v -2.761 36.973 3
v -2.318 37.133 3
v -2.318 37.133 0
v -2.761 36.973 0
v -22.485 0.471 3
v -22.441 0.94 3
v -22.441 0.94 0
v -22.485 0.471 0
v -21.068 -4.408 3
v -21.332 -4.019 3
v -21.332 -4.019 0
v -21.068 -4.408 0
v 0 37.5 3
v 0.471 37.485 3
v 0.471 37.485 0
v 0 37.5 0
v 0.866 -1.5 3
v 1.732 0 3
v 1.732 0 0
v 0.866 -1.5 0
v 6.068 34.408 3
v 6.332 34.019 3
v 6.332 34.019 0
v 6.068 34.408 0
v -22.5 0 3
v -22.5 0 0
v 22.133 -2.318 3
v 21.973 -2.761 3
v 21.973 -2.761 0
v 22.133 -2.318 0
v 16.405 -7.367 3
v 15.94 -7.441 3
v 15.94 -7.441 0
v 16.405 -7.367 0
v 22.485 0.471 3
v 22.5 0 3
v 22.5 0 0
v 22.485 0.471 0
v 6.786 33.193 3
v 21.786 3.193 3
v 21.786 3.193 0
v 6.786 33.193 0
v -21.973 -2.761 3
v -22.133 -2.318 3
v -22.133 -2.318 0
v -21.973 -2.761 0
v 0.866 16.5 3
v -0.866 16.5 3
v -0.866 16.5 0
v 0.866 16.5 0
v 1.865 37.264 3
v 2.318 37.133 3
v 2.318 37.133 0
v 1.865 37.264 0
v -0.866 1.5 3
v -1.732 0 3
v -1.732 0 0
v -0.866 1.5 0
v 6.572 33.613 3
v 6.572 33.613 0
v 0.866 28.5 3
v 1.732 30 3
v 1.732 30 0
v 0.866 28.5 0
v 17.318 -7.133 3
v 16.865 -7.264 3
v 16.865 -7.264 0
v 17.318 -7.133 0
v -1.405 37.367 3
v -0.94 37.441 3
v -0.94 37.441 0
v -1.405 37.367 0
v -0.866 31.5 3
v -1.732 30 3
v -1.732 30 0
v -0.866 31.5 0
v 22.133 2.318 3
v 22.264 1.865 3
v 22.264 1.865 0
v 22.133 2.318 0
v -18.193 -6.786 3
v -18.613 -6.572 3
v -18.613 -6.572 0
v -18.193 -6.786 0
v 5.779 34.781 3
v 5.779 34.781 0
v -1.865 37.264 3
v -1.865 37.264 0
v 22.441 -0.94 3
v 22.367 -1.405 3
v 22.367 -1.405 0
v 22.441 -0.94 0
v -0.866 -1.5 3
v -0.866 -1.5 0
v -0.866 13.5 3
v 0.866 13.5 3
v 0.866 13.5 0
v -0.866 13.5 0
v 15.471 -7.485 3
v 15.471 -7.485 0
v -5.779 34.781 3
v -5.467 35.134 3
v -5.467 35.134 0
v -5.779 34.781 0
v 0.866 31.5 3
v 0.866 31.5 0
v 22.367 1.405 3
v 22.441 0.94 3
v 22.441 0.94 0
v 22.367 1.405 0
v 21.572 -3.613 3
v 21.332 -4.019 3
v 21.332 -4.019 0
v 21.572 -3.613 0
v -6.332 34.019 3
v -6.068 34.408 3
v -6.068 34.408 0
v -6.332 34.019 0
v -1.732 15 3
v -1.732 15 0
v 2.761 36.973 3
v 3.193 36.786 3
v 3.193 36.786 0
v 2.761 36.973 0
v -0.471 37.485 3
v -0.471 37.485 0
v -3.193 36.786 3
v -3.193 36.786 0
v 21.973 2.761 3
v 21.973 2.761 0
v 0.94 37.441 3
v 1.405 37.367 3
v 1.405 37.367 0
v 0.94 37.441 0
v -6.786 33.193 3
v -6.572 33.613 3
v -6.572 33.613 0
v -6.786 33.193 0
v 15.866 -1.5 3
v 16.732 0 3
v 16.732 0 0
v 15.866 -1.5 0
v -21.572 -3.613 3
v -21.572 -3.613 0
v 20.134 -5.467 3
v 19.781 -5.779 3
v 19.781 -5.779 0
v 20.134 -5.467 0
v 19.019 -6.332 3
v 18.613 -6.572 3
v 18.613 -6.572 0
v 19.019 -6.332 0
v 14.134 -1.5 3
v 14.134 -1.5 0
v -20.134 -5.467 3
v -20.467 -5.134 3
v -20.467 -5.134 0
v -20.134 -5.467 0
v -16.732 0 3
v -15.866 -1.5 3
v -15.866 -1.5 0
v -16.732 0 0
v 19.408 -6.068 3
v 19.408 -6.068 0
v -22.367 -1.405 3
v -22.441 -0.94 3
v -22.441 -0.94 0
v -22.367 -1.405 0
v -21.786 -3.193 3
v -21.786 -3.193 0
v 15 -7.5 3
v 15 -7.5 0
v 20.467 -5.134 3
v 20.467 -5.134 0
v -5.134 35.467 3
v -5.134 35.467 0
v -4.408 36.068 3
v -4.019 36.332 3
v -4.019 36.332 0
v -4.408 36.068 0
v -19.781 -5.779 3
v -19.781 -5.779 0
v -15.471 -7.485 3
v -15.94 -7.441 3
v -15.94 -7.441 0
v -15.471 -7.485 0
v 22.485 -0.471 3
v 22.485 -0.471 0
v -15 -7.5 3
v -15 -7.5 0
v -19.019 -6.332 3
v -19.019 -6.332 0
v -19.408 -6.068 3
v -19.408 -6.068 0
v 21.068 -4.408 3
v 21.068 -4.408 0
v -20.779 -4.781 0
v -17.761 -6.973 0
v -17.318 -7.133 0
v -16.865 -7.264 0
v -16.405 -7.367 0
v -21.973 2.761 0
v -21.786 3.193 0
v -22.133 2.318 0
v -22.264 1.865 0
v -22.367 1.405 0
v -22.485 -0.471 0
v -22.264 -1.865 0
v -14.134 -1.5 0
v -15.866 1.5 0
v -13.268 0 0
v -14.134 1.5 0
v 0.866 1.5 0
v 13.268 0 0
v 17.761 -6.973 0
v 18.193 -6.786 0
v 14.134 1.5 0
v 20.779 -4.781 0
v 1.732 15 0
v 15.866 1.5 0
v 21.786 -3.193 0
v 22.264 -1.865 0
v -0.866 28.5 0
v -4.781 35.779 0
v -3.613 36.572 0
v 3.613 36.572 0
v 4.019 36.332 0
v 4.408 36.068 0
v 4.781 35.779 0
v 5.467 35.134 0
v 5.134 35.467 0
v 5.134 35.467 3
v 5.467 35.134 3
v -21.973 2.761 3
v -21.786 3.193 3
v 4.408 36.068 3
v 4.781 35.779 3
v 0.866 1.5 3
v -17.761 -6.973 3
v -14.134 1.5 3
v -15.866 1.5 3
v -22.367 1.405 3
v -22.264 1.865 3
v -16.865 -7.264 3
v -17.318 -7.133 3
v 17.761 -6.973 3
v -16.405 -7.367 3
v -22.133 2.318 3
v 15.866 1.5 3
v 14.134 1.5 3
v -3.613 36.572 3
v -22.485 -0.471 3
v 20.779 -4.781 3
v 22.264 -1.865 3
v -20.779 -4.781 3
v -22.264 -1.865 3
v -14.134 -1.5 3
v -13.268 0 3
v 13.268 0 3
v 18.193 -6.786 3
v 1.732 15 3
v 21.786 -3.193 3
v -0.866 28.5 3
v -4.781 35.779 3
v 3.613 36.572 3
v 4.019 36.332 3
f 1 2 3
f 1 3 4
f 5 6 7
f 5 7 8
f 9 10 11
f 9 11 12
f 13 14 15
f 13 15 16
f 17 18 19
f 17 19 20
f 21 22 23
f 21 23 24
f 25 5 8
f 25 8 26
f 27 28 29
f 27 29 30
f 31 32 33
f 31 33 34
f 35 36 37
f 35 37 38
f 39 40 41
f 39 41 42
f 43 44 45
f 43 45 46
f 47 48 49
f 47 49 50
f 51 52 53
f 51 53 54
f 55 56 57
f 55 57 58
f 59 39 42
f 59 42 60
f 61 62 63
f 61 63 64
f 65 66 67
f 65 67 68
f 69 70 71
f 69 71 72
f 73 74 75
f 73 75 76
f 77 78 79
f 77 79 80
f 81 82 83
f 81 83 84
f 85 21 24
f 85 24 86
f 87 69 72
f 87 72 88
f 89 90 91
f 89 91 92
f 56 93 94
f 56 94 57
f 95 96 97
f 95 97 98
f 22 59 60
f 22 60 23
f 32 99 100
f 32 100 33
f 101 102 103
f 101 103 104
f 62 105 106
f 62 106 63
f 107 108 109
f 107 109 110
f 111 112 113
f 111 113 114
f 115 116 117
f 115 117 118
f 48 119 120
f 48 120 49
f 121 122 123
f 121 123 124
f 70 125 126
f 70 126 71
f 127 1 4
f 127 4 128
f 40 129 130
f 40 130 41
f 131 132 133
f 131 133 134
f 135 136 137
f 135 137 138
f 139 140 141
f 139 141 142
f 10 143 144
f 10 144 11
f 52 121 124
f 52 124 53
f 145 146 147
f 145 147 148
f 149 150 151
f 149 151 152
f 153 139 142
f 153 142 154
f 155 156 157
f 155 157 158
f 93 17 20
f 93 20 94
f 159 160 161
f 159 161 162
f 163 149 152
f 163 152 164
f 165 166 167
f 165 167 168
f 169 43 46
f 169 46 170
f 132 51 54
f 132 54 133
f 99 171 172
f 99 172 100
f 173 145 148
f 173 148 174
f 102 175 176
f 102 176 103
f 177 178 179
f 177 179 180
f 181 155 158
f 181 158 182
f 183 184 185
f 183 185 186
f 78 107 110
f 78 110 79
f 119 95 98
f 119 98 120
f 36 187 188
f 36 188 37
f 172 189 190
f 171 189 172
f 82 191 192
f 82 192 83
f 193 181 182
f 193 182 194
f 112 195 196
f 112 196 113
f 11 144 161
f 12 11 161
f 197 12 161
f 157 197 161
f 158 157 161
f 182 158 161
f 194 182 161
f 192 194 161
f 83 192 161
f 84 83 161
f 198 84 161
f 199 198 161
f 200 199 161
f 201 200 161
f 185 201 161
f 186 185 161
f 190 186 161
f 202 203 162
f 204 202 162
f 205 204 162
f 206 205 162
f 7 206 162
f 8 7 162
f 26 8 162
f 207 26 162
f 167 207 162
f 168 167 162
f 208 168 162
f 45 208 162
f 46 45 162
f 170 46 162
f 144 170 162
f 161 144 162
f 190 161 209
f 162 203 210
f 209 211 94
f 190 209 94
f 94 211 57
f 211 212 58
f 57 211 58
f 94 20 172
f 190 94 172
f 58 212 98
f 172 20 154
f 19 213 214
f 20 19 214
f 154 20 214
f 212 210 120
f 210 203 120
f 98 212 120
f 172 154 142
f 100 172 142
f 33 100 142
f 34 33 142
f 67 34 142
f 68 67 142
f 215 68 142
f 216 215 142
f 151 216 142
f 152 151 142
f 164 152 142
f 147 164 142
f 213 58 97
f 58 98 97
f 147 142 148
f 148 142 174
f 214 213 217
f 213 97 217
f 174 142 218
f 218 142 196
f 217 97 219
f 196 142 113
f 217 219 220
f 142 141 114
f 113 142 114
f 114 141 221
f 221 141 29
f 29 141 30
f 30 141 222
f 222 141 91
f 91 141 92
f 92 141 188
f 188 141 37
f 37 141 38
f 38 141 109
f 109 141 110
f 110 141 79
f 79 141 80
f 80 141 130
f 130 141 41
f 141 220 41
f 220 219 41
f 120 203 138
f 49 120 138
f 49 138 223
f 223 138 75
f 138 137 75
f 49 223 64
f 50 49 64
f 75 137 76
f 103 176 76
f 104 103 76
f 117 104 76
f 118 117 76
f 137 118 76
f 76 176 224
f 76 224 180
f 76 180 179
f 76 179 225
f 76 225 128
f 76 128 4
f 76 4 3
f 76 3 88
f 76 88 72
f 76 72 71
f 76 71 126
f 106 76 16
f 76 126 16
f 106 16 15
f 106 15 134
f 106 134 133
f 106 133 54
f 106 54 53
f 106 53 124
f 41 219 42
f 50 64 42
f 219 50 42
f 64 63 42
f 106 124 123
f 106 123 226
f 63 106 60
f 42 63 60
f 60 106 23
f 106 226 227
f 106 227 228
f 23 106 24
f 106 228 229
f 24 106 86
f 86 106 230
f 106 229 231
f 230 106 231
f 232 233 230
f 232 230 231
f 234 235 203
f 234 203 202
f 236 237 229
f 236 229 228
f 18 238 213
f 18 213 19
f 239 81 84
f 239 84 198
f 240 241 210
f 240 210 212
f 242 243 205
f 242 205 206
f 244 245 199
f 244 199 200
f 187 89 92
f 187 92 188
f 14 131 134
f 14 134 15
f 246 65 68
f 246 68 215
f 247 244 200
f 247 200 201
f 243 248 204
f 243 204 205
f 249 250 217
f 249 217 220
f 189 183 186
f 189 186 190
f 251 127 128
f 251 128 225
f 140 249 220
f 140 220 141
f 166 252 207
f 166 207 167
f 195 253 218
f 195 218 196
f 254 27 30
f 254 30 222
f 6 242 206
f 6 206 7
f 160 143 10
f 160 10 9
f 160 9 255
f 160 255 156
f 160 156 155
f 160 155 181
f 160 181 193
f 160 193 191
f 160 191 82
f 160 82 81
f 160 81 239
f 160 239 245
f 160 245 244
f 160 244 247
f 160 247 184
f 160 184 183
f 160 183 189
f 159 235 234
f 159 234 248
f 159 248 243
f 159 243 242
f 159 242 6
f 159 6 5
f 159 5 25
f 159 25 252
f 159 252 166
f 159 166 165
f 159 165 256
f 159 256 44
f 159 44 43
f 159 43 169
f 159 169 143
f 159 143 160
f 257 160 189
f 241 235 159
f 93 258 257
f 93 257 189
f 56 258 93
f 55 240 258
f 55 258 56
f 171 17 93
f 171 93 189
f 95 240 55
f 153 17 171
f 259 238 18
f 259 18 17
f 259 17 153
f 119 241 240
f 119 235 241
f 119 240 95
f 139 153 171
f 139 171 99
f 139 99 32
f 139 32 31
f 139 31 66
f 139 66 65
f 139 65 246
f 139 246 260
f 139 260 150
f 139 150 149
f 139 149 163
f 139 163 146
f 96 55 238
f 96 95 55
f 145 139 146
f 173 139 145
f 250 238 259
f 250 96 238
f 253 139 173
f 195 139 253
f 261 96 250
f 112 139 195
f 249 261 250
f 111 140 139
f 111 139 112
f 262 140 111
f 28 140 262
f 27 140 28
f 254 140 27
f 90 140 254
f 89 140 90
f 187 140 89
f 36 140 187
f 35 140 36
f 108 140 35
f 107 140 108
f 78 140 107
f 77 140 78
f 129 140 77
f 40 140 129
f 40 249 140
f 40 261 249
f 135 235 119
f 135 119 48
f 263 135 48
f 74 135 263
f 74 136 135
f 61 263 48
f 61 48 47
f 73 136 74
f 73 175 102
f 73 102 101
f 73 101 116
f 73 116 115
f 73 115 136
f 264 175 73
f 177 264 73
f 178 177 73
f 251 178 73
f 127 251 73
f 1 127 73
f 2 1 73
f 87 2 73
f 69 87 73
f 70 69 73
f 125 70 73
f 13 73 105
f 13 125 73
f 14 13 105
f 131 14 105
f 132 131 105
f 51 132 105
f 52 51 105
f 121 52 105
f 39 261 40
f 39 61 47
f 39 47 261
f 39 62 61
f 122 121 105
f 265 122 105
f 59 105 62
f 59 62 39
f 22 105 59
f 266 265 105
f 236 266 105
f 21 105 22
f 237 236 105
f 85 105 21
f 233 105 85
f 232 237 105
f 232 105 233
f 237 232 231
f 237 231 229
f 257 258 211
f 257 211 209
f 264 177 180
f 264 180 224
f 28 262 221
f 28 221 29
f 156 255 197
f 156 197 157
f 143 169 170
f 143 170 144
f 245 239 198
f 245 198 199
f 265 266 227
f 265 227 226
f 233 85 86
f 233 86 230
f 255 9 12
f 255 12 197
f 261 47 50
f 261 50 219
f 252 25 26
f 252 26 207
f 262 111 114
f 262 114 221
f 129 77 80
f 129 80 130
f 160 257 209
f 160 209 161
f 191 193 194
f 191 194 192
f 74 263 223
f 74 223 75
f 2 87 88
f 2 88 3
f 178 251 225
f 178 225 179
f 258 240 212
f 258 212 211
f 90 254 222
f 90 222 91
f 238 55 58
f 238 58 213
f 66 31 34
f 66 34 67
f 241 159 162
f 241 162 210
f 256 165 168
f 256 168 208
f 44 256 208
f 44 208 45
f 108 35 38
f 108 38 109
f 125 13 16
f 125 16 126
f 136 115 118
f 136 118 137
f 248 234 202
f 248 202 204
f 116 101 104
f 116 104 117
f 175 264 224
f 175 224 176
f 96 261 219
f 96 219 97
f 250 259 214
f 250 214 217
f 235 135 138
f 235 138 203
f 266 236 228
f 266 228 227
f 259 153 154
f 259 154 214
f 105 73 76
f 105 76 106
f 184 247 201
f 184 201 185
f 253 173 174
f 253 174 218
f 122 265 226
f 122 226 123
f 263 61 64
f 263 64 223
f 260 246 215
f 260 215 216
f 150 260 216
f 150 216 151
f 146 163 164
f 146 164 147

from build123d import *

# Parameters (mm, degrees)
BOSS_EXTRUDE1_DEPTH = 3


with BuildPart() as part:
    # Sketch1 → Boss-Extrude1 (new body)
    with BuildSketch(Plane.XY.offset(3)):
        Polygon((22.3672, -1.40536), (22.4409, -0.939999), (22.4852, -0.470929), (22.5, 0), (22.4852, 0.470929), (22.4409, 0.939999), (22.3672, 1.40536), (22.2644, 1.86517), (22.1329, 2.31763), (21.9733, 2.76093), (21.7862, 3.19334), (6.7862, 33.1933), (6.5723, 33.6132), (6.33246, 34.0187), (6.06763, 34.4084), (5.77885, 34.7807), (5.46726, 35.1341), (5.1341, 35.4673), (4.78068, 35.7788), (4.40839, 36.0676), (4.0187, 36.3325), (3.61315, 36.5723), (3.19334, 36.7862), (2.76093, 36.9733), (2.31763, 37.1329), (1.86517, 37.2644), (1.40536, 37.3672), (0.939999, 37.4409), (0.470929, 37.4852), (0, 37.5), (-0.470929, 37.4852), (-0.939999, 37.4409), (-1.40536, 37.3672), (-1.86517, 37.2644), (-2.31763, 37.1329), (-2.76093, 36.9733), (-3.19334, 36.7862), (-3.61315, 36.5723), (-4.0187, 36.3325), (-4.40839, 36.0676), (-4.78068, 35.7788), (-5.1341, 35.4673), (-5.46726, 35.1341), (-5.77885, 34.7807), (-6.06763, 34.4084), (-6.33246, 34.0187), (-6.5723, 33.6132), (-6.7862, 33.1933), (-21.7862, 3.19334), (-21.9733, 2.76093), (-22.1329, 2.31763), (-22.2644, 1.86517), (-22.3672, 1.40536), (-22.4409, 0.939999), (-22.4852, 0.470929), (-22.5, 0), (-22.4852, -0.470929), (-22.4409, -0.939999), (-22.3672, -1.40536), (-22.2644, -1.86517), (-22.1329, -2.31763), (-21.9733, -2.76093), (-21.7862, -3.19334), (-21.5723, -3.61315), (-21.3325, -4.0187), (-21.0676, -4.40839), (-20.7788, -4.78068), (-20.4673, -5.1341), (-20.1341, -5.46726), (-19.7807, -5.77885), (-19.4084, -6.06763), (-19.0187, -6.33246), (-18.6132, -6.5723), (-18.1933, -6.7862), (-17.7609, -6.97332), (-17.3176, -7.13292), (-16.8652, -7.26437), (-16.4054, -7.36715), (-15.94, -7.44086), (-15.4709, -7.4852), (-15, -7.5), (15, -7.5), (15.4709, -7.4852), (15.94, -7.44086), (16.4054, -7.36715), (16.8652, -7.26437), (17.3176, -7.13292), (17.7609, -6.97332), (18.1933, -6.7862), (18.6132, -6.5723), (19.0187, -6.33246), (19.4084, -6.06763), (19.7807, -5.77885), (20.1341, -5.46726), (20.4673, -5.1341), (20.7788, -4.78068), (21.0676, -4.40839), (21.3325, -4.0187), (21.5723, -3.61315), (21.7862, -3.19334), (21.9733, -2.76093), (22.1329, -2.31763), (22.2644, -1.86517), align=None)
        Polygon((0.866025, 1.5), (1.73205, 0), (0.866025, -1.5), (-0.866025, -1.5), (-1.73205, 0), (-0.866025, 1.5), align=None, mode=Mode.SUBTRACT)
        Polygon((-0.866025, 31.5), (0.866025, 31.5), (1.73205, 30), (0.866025, 28.5), (-0.866025, 28.5), (-1.73205, 30), align=None, mode=Mode.SUBTRACT)
        Polygon((15.866, 1.5), (16.7321, 0), (15.866, -1.5), (14.134, -1.5), (13.2679, 0), (14.134, 1.5), align=None, mode=Mode.SUBTRACT)
        Polygon((0.866025, 16.5), (1.73205, 15), (0.866025, 13.5), (-0.866025, 13.5), (-1.73205, 15), (-0.866025, 16.5), align=None, mode=Mode.SUBTRACT)
        Polygon((-14.134, 1.5), (-13.2679, 0), (-14.134, -1.5), (-15.866, -1.5), (-16.7321, 0), (-15.866, 1.5), align=None, mode=Mode.SUBTRACT)
    extrude(amount=-BOSS_EXTRUDE1_DEPTH)


solid = part.part
